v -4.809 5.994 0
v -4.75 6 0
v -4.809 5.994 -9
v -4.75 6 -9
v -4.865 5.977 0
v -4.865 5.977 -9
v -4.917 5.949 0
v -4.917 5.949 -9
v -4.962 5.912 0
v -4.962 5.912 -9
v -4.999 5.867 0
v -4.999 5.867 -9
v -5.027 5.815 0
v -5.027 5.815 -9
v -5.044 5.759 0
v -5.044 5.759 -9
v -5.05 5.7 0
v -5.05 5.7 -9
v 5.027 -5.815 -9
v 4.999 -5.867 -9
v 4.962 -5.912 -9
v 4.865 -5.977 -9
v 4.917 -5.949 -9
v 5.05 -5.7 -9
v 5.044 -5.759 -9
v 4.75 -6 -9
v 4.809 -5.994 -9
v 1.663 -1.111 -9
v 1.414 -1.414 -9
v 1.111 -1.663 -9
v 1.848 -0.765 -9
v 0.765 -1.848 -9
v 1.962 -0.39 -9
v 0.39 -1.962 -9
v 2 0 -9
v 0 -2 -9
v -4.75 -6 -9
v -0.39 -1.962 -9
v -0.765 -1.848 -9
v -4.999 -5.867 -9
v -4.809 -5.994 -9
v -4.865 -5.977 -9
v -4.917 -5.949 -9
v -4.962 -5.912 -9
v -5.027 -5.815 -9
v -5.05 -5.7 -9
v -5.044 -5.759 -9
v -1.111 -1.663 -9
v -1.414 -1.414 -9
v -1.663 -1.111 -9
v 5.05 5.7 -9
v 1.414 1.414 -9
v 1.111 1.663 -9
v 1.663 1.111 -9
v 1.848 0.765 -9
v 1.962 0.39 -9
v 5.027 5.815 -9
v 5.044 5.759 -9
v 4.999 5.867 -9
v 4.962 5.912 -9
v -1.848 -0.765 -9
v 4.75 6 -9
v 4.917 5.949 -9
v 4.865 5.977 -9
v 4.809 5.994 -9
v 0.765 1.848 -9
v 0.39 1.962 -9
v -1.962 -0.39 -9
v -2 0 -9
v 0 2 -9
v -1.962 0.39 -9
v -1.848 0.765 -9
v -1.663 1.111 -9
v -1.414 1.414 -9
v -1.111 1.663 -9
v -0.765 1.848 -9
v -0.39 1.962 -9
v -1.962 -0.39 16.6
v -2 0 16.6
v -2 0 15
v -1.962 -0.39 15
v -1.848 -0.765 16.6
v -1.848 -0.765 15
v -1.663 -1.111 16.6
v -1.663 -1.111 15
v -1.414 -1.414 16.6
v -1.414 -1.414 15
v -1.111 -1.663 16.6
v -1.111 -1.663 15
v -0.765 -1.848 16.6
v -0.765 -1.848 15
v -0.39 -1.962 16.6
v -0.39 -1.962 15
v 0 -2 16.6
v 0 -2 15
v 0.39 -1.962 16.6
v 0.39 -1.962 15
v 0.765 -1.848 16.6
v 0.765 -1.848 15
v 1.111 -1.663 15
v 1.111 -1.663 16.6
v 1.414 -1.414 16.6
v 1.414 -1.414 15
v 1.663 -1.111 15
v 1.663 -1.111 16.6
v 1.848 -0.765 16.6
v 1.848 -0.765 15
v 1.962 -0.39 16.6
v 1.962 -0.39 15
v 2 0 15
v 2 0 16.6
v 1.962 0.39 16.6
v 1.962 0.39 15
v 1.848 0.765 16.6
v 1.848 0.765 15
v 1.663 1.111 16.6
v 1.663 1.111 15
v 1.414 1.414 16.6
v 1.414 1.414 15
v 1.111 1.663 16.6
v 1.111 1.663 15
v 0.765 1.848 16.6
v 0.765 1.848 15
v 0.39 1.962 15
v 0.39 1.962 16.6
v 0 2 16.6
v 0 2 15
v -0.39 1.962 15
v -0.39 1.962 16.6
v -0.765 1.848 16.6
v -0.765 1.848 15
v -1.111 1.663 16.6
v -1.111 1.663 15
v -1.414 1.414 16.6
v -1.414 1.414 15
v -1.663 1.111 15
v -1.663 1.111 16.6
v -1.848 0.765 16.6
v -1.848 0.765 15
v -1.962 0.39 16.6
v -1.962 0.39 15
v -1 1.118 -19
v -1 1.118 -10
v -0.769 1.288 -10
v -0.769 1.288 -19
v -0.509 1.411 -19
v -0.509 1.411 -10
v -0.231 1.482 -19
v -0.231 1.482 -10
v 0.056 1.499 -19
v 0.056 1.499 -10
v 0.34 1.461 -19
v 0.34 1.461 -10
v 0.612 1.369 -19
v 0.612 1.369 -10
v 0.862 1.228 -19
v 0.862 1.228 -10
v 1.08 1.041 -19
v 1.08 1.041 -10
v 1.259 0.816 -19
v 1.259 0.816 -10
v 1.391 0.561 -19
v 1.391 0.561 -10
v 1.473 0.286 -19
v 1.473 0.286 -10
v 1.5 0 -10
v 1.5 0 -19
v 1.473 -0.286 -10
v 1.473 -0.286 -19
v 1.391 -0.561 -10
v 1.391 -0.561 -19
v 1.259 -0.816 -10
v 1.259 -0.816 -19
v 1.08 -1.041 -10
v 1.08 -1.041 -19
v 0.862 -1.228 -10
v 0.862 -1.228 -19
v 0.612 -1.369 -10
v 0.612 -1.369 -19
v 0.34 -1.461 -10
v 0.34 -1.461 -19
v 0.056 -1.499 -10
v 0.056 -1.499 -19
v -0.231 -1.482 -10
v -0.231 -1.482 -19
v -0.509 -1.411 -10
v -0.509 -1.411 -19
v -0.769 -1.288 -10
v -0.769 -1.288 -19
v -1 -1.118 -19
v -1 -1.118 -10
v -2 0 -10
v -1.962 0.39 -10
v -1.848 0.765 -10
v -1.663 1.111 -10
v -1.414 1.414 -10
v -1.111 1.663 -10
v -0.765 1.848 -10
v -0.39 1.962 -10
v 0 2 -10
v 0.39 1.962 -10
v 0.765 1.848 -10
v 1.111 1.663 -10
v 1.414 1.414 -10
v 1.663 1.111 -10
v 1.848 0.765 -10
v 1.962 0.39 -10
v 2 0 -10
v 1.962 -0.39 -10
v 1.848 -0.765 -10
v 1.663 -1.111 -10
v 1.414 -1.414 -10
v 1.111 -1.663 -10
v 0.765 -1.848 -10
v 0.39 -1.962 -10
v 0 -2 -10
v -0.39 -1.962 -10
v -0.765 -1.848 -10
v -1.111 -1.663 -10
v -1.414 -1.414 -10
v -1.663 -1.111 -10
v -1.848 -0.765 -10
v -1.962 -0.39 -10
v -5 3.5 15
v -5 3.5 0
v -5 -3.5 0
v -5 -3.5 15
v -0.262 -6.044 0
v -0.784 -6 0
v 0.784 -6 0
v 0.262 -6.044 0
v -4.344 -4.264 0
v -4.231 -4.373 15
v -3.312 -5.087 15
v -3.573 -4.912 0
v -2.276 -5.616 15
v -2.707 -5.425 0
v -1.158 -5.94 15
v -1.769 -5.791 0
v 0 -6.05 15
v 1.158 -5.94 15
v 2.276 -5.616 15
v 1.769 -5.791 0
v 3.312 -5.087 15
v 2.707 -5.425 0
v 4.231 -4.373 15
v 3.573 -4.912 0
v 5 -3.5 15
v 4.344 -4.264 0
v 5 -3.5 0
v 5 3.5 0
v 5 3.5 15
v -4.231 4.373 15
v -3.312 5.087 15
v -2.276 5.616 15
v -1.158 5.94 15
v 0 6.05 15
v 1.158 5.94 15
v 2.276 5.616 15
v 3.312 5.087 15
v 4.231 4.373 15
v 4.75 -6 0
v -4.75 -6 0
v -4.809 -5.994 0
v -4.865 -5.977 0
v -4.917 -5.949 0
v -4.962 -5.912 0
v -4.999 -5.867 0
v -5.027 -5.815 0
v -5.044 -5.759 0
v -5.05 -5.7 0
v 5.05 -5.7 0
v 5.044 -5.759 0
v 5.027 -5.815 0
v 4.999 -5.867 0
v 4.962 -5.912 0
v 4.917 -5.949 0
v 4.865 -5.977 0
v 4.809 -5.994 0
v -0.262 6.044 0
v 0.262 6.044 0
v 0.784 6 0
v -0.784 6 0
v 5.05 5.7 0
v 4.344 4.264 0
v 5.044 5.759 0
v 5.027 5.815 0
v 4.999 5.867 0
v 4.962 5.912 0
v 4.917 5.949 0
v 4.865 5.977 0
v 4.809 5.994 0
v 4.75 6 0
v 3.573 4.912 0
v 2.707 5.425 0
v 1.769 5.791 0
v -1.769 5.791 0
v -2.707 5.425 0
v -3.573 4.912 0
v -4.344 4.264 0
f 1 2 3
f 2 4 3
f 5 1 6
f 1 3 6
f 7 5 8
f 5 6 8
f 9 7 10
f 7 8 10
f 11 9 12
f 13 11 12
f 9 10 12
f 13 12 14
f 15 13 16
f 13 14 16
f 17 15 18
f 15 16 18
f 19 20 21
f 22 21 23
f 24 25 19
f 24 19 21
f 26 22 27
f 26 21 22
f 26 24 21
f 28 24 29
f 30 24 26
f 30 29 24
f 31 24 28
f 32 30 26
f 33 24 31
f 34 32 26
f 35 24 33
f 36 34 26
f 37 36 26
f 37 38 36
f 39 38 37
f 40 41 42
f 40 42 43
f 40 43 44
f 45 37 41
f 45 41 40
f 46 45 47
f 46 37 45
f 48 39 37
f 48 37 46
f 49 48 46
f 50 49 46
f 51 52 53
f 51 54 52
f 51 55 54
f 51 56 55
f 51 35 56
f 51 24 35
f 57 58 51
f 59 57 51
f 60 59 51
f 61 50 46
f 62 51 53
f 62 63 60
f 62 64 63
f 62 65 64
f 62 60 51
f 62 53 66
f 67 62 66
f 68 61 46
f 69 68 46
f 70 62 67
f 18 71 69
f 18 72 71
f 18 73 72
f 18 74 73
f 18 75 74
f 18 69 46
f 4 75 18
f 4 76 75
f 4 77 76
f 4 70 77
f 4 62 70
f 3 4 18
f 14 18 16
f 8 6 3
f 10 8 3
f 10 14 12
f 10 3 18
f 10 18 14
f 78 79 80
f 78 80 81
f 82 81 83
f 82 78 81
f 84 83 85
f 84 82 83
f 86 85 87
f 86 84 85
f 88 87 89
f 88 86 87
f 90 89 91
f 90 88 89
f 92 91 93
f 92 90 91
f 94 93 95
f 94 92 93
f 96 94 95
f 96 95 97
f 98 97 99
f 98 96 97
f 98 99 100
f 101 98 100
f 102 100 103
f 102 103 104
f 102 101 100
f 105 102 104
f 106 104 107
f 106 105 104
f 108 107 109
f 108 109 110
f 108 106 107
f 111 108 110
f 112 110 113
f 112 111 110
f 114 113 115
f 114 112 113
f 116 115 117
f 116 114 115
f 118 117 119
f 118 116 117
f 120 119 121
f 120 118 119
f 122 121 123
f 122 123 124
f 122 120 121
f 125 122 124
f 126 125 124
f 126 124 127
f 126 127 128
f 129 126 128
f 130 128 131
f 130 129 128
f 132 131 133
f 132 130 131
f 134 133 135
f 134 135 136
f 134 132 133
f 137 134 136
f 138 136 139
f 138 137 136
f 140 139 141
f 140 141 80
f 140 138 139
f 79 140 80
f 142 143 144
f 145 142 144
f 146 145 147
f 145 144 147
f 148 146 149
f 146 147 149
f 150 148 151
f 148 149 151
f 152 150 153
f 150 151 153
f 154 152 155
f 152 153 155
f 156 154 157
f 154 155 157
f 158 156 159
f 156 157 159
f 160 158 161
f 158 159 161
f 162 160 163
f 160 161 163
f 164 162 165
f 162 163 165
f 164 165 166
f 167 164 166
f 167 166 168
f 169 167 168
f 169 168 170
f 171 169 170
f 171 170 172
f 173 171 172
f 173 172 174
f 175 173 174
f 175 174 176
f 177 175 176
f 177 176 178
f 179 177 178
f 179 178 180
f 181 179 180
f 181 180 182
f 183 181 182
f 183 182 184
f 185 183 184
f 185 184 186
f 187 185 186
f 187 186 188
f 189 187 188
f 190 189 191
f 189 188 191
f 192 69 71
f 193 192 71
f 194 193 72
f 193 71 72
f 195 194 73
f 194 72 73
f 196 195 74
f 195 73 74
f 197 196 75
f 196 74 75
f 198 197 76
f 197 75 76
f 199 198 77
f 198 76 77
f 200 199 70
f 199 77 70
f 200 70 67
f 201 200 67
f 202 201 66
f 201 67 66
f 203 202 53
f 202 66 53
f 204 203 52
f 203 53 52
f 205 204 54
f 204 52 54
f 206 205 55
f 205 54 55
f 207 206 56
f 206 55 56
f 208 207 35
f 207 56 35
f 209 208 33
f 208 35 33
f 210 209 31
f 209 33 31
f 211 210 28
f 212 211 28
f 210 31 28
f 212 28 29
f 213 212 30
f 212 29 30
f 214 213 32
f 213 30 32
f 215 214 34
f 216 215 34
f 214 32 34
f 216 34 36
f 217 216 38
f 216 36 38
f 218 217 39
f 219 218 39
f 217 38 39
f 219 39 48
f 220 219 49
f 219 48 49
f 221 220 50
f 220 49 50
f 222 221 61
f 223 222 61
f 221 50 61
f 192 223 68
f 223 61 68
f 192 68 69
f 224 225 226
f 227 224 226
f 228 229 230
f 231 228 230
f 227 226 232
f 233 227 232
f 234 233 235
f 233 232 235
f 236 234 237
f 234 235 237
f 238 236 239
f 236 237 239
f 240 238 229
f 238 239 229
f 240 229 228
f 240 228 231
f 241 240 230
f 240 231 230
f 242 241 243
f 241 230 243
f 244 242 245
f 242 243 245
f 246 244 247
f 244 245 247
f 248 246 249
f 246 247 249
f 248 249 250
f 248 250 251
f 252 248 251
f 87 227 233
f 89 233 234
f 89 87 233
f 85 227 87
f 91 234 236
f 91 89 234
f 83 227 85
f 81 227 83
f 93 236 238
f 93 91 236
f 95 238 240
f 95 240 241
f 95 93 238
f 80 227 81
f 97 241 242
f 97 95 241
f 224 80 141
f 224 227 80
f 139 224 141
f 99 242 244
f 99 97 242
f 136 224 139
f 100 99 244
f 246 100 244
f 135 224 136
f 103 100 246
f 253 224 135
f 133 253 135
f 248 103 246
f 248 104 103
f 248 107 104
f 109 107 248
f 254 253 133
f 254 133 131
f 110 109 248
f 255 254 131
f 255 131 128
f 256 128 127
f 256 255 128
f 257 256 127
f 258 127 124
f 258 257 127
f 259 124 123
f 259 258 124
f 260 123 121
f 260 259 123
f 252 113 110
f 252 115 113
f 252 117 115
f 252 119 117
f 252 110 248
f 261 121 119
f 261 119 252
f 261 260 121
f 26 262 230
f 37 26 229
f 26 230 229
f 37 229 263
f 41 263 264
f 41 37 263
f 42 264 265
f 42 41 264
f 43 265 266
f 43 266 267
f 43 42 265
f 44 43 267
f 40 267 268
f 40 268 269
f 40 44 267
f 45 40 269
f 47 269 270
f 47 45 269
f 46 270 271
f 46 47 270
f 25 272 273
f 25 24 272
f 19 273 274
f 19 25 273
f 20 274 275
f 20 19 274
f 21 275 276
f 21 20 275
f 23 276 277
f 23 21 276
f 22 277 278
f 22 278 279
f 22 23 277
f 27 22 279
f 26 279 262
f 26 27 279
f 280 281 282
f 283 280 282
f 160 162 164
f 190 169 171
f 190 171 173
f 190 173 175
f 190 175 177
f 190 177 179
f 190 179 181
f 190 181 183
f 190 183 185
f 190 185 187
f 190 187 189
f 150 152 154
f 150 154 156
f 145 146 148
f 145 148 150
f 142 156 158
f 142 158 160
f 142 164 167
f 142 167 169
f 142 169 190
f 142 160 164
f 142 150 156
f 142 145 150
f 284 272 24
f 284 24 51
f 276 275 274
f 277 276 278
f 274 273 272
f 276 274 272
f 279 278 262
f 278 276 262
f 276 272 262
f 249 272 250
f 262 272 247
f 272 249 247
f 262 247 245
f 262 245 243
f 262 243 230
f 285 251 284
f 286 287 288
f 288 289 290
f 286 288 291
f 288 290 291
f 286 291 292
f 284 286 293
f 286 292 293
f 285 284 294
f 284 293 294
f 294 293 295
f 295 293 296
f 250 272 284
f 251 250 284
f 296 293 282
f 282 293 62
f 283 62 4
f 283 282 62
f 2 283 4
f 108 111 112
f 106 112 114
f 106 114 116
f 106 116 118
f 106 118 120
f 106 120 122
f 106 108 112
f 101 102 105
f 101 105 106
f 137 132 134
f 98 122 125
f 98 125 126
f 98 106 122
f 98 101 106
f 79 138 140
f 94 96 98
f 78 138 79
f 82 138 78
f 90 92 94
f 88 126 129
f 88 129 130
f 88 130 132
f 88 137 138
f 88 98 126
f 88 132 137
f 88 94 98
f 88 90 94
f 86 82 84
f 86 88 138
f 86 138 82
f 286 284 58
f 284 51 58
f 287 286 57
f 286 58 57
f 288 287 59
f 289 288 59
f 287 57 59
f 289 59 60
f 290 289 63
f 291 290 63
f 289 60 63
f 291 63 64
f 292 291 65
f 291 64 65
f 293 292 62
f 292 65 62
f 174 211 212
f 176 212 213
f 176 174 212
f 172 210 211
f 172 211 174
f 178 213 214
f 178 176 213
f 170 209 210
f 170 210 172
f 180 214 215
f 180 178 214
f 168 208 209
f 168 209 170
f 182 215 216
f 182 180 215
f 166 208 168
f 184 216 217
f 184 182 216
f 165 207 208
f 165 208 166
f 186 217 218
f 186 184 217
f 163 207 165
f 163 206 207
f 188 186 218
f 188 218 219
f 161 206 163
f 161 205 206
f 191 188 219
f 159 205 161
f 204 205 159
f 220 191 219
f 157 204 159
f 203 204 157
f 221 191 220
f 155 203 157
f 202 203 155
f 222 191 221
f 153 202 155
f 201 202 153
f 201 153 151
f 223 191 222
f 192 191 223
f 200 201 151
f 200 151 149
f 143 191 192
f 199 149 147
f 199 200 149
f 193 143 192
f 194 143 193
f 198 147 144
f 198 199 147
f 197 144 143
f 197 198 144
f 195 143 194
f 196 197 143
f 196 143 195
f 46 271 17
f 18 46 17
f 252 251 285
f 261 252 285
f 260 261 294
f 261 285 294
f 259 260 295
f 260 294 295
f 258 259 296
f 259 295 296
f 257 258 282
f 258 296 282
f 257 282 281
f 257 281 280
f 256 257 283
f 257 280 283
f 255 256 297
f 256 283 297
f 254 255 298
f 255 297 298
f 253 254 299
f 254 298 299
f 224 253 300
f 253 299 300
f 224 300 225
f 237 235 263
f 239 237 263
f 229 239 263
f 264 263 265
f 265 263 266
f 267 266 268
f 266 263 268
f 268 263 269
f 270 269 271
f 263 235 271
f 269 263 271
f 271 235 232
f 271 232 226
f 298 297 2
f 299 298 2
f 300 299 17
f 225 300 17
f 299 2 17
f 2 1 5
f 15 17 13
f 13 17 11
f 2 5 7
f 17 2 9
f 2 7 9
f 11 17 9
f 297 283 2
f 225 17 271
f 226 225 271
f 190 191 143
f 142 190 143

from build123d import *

# Parameters (mm, degrees)
BOSS_EXTRU_1_DEPTH = 15
ESQUISSE2_W        = 10.1
ESQUISSE2_H        = 12
BOSS_EXTRU_2_DEPTH = 9
BOSS_EXTRU_3_DEPTH = 10
ESQUISSE4_R        = 2
BOSS_EXTRU_4_DEPTH = 1
BOSS_EXTRU_5_START = 1.6
ESQUISSE5_R        = 2
BOSS_EXTRU_5_DEPTH = 1.6
CONG_1_R           = 0.3


with BuildPart() as part:
    # Esquisse1 → Boss.-Extru.1 (new body)
    with BuildSketch(Plane.XY):
        with BuildLine():
            Line((5, -3.5), (5, 3.5))
            ThreePointArc((5, 3.5), (0, 6.05), (-5, 3.5))
            Line((-5, 3.5), (-5, -3.5))
            ThreePointArc((-5, -3.5), (0, -6.05), (5, -3.5))
        make_face()
    extrude(amount=BOSS_EXTRU_1_DEPTH)

    # Esquisse2 → Boss.-Extru.2 (add)
    with BuildSketch(Plane(origin=(0, 0, 0), x_dir=(-1, 0, 0), z_dir=(0, 0, -1))):
        Rectangle(ESQUISSE2_W, ESQUISSE2_H)
    extrude(amount=BOSS_EXTRU_2_DEPTH)

    # Esquisse3 → Boss.-Extru.3 (add)
    with BuildSketch(Plane(origin=(0, 0, -9), x_dir=(-1, 0, 0), z_dir=(0, 0, -1))):
        with BuildLine():
            Line((1, -1.118033989), (1, 1.118033989))
            ThreePointArc((1, 1.118033989), (-1.5, 0), (1, -1.118033989))
        make_face()
    extrude(amount=BOSS_EXTRU_3_DEPTH)

    # Esquisse4 → Boss.-Extru.4 (add)
    with BuildSketch(Plane(origin=(0, 0, -9), x_dir=(-1, 0, 0), z_dir=(0, 0, -1))):
        Circle(ESQUISSE4_R)
    extrude(amount=BOSS_EXTRU_4_DEPTH)

    # Esquisse5 → Boss.-Extru.5 (add)
    with BuildSketch(Plane.XY.offset(15).offset(BOSS_EXTRU_5_START)):
        with Locations(Location((0, 0, 0), (0, 0, 180))):
            Circle(ESQUISSE5_R)
    extrude(amount=-BOSS_EXTRU_5_DEPTH)

    # Congé1
    cong_1_edges = [part.edges().sort_by_distance(p)[0] for p in [
        (5.05, 6, -4.5),
        (5.05, -6, -4.5),
        (-5.05, -6, -4.5),
        (-5.05, 6, -4.5),
    ]]
    fillet(cong_1_edges, radius=CONG_1_R)


solid = part.part
